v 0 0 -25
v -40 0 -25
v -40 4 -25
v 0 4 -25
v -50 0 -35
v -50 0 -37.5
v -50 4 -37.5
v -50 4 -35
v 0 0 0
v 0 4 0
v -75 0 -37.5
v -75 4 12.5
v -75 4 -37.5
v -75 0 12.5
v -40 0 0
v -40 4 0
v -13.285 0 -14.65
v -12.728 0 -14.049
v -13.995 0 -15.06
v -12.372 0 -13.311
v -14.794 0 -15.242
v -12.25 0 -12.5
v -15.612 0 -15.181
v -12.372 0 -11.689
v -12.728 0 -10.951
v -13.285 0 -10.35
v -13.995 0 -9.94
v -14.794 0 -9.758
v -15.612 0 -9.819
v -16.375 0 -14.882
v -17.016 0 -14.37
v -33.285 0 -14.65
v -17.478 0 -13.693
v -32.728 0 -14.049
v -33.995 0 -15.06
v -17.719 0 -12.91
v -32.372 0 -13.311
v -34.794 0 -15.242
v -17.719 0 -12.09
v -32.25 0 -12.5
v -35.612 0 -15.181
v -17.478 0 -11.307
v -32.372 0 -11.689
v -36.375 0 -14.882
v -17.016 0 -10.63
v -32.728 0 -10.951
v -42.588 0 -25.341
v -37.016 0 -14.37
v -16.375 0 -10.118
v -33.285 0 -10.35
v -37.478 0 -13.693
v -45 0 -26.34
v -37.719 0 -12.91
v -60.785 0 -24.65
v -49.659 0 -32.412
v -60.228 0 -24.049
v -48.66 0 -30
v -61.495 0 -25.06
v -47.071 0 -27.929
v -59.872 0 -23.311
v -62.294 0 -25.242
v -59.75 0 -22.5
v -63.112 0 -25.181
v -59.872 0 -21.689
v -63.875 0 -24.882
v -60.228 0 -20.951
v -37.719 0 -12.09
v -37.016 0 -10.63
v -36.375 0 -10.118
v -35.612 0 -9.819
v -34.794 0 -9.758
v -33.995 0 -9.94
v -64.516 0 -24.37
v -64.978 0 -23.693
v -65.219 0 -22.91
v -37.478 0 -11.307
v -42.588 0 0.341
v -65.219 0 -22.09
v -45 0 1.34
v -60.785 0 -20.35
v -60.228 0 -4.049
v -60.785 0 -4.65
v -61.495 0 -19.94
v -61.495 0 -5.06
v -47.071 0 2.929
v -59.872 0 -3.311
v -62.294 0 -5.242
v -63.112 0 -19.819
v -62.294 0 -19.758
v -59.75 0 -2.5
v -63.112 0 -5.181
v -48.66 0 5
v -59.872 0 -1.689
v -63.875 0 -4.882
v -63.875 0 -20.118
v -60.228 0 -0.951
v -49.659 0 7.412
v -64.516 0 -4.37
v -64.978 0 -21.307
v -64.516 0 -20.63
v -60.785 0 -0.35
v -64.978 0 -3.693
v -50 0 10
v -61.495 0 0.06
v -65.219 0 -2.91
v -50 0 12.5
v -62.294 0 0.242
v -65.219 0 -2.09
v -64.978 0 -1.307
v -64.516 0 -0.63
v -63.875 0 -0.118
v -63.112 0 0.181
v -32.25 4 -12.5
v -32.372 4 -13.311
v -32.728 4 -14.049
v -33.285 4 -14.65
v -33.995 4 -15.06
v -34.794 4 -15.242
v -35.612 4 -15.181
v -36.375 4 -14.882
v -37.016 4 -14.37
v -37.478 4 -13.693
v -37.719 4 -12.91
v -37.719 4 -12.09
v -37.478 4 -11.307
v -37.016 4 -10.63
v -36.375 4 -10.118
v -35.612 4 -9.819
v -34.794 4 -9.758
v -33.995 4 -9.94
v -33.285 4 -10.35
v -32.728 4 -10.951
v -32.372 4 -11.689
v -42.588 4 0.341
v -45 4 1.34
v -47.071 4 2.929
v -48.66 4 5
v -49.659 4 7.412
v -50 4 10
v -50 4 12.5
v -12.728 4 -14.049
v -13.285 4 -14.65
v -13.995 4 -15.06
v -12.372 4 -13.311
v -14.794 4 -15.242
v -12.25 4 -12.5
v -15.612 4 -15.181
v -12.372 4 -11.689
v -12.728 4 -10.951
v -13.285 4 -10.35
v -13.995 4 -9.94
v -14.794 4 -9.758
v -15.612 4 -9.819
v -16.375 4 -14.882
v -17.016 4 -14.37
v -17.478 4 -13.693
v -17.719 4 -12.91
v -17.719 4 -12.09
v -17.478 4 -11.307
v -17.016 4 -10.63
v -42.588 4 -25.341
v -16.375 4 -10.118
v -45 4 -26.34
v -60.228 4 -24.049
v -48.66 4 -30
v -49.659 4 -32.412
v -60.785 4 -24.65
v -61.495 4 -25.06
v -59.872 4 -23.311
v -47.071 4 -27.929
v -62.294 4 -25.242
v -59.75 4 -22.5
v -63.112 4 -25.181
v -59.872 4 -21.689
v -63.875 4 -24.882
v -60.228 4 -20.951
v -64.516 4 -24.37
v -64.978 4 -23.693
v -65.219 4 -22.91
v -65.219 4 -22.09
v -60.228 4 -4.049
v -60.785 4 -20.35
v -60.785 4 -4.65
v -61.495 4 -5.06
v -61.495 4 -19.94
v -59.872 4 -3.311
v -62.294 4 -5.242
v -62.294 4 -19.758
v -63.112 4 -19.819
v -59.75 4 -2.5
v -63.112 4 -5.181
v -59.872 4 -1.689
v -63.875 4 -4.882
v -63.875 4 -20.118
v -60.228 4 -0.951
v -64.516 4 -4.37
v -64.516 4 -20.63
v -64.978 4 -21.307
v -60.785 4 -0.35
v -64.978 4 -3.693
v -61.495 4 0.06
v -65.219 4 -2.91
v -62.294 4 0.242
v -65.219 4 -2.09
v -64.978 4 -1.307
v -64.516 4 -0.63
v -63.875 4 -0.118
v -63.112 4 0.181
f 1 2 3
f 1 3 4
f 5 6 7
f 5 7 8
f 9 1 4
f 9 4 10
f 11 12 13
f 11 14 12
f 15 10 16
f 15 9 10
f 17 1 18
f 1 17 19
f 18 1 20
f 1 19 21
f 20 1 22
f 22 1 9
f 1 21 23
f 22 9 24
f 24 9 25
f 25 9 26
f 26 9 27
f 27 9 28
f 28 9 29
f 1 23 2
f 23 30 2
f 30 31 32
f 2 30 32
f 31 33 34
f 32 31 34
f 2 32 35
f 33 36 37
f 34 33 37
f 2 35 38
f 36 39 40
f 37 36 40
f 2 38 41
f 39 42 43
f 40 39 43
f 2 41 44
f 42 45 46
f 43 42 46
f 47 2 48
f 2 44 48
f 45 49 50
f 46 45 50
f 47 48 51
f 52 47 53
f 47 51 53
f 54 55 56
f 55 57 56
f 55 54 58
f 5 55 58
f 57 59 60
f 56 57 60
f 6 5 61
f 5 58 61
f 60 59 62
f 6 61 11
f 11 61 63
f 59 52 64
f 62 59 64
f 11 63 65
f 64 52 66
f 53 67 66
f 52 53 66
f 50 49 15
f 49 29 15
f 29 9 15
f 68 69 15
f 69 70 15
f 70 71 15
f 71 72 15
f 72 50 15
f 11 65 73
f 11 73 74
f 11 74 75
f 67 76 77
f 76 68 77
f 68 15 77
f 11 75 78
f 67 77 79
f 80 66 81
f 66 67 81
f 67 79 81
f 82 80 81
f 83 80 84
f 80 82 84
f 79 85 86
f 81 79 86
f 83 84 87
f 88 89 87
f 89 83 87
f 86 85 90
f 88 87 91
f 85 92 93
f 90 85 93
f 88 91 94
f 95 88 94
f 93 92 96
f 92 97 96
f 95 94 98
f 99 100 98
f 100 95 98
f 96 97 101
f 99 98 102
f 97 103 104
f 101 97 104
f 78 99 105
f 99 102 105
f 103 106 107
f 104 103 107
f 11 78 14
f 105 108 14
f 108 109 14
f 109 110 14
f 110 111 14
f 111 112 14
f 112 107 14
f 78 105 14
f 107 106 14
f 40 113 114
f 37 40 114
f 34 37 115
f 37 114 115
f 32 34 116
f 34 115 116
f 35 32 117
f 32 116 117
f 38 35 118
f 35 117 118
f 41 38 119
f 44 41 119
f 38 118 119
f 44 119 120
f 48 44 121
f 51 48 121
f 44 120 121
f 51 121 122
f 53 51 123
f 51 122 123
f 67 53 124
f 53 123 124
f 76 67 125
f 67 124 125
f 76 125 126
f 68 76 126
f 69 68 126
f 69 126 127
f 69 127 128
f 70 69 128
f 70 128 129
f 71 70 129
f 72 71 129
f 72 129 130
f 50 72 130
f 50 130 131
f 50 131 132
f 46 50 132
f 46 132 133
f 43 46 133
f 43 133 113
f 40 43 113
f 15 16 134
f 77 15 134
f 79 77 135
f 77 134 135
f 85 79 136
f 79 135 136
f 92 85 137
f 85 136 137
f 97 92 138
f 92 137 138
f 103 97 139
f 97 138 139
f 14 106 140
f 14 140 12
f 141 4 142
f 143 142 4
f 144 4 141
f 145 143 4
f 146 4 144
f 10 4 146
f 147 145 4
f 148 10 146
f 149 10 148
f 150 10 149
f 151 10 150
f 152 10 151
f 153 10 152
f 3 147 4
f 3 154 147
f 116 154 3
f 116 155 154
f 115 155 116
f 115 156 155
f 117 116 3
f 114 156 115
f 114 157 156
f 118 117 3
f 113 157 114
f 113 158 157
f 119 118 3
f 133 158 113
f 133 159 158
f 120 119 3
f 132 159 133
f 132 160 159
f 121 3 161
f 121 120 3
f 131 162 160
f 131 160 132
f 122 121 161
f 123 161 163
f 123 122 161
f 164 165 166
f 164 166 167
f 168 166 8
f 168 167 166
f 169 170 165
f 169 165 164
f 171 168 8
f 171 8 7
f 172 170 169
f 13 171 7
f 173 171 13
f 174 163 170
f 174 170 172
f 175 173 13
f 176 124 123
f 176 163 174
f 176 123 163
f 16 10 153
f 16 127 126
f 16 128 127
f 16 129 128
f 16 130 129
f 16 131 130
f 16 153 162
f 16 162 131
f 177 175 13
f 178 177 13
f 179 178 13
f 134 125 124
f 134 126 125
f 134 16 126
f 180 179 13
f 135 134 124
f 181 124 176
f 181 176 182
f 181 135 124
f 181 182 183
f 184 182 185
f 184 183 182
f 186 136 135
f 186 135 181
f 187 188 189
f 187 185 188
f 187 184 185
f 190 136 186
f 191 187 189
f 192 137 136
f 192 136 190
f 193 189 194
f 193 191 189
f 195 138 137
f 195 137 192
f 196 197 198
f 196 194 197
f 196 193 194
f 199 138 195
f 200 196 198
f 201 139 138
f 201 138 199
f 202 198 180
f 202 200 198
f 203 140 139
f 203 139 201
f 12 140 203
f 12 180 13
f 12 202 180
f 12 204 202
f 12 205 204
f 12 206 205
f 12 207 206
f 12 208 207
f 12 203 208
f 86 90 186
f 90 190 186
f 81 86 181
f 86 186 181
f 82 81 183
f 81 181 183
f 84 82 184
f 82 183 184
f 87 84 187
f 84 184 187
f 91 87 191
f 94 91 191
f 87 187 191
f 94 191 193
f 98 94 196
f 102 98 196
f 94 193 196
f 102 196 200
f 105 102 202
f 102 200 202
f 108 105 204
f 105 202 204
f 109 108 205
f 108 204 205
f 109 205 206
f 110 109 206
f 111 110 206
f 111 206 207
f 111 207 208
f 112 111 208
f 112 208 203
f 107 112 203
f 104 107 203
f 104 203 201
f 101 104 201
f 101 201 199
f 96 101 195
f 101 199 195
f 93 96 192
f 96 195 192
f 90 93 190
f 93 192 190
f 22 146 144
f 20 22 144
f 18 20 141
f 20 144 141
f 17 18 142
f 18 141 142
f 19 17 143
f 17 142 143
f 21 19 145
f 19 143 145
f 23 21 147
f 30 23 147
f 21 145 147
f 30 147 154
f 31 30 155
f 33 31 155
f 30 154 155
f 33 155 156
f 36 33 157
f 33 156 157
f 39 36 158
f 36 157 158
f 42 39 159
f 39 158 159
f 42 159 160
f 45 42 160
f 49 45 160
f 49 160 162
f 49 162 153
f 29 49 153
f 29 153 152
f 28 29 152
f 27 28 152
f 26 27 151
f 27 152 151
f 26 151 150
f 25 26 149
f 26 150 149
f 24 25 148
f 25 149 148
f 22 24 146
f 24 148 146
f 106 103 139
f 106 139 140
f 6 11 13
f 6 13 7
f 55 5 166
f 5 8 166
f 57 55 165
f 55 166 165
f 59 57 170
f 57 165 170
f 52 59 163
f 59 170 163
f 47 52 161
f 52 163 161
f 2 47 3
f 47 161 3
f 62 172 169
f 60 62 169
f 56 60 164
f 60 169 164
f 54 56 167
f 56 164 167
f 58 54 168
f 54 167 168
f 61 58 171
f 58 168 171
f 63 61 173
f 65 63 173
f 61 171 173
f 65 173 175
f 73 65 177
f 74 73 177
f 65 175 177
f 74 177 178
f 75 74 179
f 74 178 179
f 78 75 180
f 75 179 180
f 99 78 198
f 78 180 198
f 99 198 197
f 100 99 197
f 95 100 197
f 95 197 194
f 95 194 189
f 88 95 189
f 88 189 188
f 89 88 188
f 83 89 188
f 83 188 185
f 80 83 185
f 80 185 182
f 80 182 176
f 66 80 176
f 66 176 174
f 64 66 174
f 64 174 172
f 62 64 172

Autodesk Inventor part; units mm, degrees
ref_plane "YZ Plane" through (0, 0, 0) normal (1, 0, 0) x (0, 1, 0)
ref_plane "XZ Plane" through (0, 0, 0) normal (0, 1, 0) x (-1, 0, 0)
ref_plane "XY Plane" through (0, 0, 0) normal (0, 0, 1) x (1, 0, 0)
sketch "Sketch1" plane through (0, 0, 0) normal (0, 1, 0) x (-1, 0, 0)
  line L0 (0, 0) -> (50, 0)
  line L1 (50, 0) -> (50, 12.5)
  line L2 (50, 12.5) -> (75, 12.5)
  line L3 (75, 12.5) -> (75, -37.5)
  line L4 (75, -37.5) -> (50, -37.5)
  line L5 (50, -37.5) -> (50, -25)
  line L6 (50, -25) -> (0, -25)
  line L7 (0, -25) -> (0, 0)
  dimension "d0" = 25
  dimension "d1" = 50
  dimension "d2" = 50
  dimension "d3" = 25
extrude "Extrusion1" add sketch "Sketch1" along normal blind 4
sketch "Sketch2" plane through (0, 4, 0) normal (0, 1, 0) x (1, 0, 0)
  circle A0 centre (-15, 12.5) radius 2.75 projected
  circle A1 centre (-35, 12.5) radius 2.75 projected
  circle A2 centre (-62.5, 2.5) radius 2.75
  circle A3 centre (-62.5, 22.5) radius 2.75
  line L0 (-75, -12.5) -> (-50, -12.5) projected
  line L1 (-62.5, -12.5) -> (-62.5, 37.5) construction
  line L2 (-50, 37.5) -> (-75, 37.5) projected
  point P0 (0, 0)
  dimension "d6" = 5.5
  dimension "d7" = 5.5
  dimension "d8" = 20
  dimension "d9" = 10
extrude "Extrusion2" cut sketch "Sketch2" against normal through all
fillet "Fillet1" radius 10 2 edges at (-50, 2, 0) (-50, 2, -25)
equation "\"d9\" = 0.5 * d8"
properties part number "Support Extrusion Brace" material "CFRP"
